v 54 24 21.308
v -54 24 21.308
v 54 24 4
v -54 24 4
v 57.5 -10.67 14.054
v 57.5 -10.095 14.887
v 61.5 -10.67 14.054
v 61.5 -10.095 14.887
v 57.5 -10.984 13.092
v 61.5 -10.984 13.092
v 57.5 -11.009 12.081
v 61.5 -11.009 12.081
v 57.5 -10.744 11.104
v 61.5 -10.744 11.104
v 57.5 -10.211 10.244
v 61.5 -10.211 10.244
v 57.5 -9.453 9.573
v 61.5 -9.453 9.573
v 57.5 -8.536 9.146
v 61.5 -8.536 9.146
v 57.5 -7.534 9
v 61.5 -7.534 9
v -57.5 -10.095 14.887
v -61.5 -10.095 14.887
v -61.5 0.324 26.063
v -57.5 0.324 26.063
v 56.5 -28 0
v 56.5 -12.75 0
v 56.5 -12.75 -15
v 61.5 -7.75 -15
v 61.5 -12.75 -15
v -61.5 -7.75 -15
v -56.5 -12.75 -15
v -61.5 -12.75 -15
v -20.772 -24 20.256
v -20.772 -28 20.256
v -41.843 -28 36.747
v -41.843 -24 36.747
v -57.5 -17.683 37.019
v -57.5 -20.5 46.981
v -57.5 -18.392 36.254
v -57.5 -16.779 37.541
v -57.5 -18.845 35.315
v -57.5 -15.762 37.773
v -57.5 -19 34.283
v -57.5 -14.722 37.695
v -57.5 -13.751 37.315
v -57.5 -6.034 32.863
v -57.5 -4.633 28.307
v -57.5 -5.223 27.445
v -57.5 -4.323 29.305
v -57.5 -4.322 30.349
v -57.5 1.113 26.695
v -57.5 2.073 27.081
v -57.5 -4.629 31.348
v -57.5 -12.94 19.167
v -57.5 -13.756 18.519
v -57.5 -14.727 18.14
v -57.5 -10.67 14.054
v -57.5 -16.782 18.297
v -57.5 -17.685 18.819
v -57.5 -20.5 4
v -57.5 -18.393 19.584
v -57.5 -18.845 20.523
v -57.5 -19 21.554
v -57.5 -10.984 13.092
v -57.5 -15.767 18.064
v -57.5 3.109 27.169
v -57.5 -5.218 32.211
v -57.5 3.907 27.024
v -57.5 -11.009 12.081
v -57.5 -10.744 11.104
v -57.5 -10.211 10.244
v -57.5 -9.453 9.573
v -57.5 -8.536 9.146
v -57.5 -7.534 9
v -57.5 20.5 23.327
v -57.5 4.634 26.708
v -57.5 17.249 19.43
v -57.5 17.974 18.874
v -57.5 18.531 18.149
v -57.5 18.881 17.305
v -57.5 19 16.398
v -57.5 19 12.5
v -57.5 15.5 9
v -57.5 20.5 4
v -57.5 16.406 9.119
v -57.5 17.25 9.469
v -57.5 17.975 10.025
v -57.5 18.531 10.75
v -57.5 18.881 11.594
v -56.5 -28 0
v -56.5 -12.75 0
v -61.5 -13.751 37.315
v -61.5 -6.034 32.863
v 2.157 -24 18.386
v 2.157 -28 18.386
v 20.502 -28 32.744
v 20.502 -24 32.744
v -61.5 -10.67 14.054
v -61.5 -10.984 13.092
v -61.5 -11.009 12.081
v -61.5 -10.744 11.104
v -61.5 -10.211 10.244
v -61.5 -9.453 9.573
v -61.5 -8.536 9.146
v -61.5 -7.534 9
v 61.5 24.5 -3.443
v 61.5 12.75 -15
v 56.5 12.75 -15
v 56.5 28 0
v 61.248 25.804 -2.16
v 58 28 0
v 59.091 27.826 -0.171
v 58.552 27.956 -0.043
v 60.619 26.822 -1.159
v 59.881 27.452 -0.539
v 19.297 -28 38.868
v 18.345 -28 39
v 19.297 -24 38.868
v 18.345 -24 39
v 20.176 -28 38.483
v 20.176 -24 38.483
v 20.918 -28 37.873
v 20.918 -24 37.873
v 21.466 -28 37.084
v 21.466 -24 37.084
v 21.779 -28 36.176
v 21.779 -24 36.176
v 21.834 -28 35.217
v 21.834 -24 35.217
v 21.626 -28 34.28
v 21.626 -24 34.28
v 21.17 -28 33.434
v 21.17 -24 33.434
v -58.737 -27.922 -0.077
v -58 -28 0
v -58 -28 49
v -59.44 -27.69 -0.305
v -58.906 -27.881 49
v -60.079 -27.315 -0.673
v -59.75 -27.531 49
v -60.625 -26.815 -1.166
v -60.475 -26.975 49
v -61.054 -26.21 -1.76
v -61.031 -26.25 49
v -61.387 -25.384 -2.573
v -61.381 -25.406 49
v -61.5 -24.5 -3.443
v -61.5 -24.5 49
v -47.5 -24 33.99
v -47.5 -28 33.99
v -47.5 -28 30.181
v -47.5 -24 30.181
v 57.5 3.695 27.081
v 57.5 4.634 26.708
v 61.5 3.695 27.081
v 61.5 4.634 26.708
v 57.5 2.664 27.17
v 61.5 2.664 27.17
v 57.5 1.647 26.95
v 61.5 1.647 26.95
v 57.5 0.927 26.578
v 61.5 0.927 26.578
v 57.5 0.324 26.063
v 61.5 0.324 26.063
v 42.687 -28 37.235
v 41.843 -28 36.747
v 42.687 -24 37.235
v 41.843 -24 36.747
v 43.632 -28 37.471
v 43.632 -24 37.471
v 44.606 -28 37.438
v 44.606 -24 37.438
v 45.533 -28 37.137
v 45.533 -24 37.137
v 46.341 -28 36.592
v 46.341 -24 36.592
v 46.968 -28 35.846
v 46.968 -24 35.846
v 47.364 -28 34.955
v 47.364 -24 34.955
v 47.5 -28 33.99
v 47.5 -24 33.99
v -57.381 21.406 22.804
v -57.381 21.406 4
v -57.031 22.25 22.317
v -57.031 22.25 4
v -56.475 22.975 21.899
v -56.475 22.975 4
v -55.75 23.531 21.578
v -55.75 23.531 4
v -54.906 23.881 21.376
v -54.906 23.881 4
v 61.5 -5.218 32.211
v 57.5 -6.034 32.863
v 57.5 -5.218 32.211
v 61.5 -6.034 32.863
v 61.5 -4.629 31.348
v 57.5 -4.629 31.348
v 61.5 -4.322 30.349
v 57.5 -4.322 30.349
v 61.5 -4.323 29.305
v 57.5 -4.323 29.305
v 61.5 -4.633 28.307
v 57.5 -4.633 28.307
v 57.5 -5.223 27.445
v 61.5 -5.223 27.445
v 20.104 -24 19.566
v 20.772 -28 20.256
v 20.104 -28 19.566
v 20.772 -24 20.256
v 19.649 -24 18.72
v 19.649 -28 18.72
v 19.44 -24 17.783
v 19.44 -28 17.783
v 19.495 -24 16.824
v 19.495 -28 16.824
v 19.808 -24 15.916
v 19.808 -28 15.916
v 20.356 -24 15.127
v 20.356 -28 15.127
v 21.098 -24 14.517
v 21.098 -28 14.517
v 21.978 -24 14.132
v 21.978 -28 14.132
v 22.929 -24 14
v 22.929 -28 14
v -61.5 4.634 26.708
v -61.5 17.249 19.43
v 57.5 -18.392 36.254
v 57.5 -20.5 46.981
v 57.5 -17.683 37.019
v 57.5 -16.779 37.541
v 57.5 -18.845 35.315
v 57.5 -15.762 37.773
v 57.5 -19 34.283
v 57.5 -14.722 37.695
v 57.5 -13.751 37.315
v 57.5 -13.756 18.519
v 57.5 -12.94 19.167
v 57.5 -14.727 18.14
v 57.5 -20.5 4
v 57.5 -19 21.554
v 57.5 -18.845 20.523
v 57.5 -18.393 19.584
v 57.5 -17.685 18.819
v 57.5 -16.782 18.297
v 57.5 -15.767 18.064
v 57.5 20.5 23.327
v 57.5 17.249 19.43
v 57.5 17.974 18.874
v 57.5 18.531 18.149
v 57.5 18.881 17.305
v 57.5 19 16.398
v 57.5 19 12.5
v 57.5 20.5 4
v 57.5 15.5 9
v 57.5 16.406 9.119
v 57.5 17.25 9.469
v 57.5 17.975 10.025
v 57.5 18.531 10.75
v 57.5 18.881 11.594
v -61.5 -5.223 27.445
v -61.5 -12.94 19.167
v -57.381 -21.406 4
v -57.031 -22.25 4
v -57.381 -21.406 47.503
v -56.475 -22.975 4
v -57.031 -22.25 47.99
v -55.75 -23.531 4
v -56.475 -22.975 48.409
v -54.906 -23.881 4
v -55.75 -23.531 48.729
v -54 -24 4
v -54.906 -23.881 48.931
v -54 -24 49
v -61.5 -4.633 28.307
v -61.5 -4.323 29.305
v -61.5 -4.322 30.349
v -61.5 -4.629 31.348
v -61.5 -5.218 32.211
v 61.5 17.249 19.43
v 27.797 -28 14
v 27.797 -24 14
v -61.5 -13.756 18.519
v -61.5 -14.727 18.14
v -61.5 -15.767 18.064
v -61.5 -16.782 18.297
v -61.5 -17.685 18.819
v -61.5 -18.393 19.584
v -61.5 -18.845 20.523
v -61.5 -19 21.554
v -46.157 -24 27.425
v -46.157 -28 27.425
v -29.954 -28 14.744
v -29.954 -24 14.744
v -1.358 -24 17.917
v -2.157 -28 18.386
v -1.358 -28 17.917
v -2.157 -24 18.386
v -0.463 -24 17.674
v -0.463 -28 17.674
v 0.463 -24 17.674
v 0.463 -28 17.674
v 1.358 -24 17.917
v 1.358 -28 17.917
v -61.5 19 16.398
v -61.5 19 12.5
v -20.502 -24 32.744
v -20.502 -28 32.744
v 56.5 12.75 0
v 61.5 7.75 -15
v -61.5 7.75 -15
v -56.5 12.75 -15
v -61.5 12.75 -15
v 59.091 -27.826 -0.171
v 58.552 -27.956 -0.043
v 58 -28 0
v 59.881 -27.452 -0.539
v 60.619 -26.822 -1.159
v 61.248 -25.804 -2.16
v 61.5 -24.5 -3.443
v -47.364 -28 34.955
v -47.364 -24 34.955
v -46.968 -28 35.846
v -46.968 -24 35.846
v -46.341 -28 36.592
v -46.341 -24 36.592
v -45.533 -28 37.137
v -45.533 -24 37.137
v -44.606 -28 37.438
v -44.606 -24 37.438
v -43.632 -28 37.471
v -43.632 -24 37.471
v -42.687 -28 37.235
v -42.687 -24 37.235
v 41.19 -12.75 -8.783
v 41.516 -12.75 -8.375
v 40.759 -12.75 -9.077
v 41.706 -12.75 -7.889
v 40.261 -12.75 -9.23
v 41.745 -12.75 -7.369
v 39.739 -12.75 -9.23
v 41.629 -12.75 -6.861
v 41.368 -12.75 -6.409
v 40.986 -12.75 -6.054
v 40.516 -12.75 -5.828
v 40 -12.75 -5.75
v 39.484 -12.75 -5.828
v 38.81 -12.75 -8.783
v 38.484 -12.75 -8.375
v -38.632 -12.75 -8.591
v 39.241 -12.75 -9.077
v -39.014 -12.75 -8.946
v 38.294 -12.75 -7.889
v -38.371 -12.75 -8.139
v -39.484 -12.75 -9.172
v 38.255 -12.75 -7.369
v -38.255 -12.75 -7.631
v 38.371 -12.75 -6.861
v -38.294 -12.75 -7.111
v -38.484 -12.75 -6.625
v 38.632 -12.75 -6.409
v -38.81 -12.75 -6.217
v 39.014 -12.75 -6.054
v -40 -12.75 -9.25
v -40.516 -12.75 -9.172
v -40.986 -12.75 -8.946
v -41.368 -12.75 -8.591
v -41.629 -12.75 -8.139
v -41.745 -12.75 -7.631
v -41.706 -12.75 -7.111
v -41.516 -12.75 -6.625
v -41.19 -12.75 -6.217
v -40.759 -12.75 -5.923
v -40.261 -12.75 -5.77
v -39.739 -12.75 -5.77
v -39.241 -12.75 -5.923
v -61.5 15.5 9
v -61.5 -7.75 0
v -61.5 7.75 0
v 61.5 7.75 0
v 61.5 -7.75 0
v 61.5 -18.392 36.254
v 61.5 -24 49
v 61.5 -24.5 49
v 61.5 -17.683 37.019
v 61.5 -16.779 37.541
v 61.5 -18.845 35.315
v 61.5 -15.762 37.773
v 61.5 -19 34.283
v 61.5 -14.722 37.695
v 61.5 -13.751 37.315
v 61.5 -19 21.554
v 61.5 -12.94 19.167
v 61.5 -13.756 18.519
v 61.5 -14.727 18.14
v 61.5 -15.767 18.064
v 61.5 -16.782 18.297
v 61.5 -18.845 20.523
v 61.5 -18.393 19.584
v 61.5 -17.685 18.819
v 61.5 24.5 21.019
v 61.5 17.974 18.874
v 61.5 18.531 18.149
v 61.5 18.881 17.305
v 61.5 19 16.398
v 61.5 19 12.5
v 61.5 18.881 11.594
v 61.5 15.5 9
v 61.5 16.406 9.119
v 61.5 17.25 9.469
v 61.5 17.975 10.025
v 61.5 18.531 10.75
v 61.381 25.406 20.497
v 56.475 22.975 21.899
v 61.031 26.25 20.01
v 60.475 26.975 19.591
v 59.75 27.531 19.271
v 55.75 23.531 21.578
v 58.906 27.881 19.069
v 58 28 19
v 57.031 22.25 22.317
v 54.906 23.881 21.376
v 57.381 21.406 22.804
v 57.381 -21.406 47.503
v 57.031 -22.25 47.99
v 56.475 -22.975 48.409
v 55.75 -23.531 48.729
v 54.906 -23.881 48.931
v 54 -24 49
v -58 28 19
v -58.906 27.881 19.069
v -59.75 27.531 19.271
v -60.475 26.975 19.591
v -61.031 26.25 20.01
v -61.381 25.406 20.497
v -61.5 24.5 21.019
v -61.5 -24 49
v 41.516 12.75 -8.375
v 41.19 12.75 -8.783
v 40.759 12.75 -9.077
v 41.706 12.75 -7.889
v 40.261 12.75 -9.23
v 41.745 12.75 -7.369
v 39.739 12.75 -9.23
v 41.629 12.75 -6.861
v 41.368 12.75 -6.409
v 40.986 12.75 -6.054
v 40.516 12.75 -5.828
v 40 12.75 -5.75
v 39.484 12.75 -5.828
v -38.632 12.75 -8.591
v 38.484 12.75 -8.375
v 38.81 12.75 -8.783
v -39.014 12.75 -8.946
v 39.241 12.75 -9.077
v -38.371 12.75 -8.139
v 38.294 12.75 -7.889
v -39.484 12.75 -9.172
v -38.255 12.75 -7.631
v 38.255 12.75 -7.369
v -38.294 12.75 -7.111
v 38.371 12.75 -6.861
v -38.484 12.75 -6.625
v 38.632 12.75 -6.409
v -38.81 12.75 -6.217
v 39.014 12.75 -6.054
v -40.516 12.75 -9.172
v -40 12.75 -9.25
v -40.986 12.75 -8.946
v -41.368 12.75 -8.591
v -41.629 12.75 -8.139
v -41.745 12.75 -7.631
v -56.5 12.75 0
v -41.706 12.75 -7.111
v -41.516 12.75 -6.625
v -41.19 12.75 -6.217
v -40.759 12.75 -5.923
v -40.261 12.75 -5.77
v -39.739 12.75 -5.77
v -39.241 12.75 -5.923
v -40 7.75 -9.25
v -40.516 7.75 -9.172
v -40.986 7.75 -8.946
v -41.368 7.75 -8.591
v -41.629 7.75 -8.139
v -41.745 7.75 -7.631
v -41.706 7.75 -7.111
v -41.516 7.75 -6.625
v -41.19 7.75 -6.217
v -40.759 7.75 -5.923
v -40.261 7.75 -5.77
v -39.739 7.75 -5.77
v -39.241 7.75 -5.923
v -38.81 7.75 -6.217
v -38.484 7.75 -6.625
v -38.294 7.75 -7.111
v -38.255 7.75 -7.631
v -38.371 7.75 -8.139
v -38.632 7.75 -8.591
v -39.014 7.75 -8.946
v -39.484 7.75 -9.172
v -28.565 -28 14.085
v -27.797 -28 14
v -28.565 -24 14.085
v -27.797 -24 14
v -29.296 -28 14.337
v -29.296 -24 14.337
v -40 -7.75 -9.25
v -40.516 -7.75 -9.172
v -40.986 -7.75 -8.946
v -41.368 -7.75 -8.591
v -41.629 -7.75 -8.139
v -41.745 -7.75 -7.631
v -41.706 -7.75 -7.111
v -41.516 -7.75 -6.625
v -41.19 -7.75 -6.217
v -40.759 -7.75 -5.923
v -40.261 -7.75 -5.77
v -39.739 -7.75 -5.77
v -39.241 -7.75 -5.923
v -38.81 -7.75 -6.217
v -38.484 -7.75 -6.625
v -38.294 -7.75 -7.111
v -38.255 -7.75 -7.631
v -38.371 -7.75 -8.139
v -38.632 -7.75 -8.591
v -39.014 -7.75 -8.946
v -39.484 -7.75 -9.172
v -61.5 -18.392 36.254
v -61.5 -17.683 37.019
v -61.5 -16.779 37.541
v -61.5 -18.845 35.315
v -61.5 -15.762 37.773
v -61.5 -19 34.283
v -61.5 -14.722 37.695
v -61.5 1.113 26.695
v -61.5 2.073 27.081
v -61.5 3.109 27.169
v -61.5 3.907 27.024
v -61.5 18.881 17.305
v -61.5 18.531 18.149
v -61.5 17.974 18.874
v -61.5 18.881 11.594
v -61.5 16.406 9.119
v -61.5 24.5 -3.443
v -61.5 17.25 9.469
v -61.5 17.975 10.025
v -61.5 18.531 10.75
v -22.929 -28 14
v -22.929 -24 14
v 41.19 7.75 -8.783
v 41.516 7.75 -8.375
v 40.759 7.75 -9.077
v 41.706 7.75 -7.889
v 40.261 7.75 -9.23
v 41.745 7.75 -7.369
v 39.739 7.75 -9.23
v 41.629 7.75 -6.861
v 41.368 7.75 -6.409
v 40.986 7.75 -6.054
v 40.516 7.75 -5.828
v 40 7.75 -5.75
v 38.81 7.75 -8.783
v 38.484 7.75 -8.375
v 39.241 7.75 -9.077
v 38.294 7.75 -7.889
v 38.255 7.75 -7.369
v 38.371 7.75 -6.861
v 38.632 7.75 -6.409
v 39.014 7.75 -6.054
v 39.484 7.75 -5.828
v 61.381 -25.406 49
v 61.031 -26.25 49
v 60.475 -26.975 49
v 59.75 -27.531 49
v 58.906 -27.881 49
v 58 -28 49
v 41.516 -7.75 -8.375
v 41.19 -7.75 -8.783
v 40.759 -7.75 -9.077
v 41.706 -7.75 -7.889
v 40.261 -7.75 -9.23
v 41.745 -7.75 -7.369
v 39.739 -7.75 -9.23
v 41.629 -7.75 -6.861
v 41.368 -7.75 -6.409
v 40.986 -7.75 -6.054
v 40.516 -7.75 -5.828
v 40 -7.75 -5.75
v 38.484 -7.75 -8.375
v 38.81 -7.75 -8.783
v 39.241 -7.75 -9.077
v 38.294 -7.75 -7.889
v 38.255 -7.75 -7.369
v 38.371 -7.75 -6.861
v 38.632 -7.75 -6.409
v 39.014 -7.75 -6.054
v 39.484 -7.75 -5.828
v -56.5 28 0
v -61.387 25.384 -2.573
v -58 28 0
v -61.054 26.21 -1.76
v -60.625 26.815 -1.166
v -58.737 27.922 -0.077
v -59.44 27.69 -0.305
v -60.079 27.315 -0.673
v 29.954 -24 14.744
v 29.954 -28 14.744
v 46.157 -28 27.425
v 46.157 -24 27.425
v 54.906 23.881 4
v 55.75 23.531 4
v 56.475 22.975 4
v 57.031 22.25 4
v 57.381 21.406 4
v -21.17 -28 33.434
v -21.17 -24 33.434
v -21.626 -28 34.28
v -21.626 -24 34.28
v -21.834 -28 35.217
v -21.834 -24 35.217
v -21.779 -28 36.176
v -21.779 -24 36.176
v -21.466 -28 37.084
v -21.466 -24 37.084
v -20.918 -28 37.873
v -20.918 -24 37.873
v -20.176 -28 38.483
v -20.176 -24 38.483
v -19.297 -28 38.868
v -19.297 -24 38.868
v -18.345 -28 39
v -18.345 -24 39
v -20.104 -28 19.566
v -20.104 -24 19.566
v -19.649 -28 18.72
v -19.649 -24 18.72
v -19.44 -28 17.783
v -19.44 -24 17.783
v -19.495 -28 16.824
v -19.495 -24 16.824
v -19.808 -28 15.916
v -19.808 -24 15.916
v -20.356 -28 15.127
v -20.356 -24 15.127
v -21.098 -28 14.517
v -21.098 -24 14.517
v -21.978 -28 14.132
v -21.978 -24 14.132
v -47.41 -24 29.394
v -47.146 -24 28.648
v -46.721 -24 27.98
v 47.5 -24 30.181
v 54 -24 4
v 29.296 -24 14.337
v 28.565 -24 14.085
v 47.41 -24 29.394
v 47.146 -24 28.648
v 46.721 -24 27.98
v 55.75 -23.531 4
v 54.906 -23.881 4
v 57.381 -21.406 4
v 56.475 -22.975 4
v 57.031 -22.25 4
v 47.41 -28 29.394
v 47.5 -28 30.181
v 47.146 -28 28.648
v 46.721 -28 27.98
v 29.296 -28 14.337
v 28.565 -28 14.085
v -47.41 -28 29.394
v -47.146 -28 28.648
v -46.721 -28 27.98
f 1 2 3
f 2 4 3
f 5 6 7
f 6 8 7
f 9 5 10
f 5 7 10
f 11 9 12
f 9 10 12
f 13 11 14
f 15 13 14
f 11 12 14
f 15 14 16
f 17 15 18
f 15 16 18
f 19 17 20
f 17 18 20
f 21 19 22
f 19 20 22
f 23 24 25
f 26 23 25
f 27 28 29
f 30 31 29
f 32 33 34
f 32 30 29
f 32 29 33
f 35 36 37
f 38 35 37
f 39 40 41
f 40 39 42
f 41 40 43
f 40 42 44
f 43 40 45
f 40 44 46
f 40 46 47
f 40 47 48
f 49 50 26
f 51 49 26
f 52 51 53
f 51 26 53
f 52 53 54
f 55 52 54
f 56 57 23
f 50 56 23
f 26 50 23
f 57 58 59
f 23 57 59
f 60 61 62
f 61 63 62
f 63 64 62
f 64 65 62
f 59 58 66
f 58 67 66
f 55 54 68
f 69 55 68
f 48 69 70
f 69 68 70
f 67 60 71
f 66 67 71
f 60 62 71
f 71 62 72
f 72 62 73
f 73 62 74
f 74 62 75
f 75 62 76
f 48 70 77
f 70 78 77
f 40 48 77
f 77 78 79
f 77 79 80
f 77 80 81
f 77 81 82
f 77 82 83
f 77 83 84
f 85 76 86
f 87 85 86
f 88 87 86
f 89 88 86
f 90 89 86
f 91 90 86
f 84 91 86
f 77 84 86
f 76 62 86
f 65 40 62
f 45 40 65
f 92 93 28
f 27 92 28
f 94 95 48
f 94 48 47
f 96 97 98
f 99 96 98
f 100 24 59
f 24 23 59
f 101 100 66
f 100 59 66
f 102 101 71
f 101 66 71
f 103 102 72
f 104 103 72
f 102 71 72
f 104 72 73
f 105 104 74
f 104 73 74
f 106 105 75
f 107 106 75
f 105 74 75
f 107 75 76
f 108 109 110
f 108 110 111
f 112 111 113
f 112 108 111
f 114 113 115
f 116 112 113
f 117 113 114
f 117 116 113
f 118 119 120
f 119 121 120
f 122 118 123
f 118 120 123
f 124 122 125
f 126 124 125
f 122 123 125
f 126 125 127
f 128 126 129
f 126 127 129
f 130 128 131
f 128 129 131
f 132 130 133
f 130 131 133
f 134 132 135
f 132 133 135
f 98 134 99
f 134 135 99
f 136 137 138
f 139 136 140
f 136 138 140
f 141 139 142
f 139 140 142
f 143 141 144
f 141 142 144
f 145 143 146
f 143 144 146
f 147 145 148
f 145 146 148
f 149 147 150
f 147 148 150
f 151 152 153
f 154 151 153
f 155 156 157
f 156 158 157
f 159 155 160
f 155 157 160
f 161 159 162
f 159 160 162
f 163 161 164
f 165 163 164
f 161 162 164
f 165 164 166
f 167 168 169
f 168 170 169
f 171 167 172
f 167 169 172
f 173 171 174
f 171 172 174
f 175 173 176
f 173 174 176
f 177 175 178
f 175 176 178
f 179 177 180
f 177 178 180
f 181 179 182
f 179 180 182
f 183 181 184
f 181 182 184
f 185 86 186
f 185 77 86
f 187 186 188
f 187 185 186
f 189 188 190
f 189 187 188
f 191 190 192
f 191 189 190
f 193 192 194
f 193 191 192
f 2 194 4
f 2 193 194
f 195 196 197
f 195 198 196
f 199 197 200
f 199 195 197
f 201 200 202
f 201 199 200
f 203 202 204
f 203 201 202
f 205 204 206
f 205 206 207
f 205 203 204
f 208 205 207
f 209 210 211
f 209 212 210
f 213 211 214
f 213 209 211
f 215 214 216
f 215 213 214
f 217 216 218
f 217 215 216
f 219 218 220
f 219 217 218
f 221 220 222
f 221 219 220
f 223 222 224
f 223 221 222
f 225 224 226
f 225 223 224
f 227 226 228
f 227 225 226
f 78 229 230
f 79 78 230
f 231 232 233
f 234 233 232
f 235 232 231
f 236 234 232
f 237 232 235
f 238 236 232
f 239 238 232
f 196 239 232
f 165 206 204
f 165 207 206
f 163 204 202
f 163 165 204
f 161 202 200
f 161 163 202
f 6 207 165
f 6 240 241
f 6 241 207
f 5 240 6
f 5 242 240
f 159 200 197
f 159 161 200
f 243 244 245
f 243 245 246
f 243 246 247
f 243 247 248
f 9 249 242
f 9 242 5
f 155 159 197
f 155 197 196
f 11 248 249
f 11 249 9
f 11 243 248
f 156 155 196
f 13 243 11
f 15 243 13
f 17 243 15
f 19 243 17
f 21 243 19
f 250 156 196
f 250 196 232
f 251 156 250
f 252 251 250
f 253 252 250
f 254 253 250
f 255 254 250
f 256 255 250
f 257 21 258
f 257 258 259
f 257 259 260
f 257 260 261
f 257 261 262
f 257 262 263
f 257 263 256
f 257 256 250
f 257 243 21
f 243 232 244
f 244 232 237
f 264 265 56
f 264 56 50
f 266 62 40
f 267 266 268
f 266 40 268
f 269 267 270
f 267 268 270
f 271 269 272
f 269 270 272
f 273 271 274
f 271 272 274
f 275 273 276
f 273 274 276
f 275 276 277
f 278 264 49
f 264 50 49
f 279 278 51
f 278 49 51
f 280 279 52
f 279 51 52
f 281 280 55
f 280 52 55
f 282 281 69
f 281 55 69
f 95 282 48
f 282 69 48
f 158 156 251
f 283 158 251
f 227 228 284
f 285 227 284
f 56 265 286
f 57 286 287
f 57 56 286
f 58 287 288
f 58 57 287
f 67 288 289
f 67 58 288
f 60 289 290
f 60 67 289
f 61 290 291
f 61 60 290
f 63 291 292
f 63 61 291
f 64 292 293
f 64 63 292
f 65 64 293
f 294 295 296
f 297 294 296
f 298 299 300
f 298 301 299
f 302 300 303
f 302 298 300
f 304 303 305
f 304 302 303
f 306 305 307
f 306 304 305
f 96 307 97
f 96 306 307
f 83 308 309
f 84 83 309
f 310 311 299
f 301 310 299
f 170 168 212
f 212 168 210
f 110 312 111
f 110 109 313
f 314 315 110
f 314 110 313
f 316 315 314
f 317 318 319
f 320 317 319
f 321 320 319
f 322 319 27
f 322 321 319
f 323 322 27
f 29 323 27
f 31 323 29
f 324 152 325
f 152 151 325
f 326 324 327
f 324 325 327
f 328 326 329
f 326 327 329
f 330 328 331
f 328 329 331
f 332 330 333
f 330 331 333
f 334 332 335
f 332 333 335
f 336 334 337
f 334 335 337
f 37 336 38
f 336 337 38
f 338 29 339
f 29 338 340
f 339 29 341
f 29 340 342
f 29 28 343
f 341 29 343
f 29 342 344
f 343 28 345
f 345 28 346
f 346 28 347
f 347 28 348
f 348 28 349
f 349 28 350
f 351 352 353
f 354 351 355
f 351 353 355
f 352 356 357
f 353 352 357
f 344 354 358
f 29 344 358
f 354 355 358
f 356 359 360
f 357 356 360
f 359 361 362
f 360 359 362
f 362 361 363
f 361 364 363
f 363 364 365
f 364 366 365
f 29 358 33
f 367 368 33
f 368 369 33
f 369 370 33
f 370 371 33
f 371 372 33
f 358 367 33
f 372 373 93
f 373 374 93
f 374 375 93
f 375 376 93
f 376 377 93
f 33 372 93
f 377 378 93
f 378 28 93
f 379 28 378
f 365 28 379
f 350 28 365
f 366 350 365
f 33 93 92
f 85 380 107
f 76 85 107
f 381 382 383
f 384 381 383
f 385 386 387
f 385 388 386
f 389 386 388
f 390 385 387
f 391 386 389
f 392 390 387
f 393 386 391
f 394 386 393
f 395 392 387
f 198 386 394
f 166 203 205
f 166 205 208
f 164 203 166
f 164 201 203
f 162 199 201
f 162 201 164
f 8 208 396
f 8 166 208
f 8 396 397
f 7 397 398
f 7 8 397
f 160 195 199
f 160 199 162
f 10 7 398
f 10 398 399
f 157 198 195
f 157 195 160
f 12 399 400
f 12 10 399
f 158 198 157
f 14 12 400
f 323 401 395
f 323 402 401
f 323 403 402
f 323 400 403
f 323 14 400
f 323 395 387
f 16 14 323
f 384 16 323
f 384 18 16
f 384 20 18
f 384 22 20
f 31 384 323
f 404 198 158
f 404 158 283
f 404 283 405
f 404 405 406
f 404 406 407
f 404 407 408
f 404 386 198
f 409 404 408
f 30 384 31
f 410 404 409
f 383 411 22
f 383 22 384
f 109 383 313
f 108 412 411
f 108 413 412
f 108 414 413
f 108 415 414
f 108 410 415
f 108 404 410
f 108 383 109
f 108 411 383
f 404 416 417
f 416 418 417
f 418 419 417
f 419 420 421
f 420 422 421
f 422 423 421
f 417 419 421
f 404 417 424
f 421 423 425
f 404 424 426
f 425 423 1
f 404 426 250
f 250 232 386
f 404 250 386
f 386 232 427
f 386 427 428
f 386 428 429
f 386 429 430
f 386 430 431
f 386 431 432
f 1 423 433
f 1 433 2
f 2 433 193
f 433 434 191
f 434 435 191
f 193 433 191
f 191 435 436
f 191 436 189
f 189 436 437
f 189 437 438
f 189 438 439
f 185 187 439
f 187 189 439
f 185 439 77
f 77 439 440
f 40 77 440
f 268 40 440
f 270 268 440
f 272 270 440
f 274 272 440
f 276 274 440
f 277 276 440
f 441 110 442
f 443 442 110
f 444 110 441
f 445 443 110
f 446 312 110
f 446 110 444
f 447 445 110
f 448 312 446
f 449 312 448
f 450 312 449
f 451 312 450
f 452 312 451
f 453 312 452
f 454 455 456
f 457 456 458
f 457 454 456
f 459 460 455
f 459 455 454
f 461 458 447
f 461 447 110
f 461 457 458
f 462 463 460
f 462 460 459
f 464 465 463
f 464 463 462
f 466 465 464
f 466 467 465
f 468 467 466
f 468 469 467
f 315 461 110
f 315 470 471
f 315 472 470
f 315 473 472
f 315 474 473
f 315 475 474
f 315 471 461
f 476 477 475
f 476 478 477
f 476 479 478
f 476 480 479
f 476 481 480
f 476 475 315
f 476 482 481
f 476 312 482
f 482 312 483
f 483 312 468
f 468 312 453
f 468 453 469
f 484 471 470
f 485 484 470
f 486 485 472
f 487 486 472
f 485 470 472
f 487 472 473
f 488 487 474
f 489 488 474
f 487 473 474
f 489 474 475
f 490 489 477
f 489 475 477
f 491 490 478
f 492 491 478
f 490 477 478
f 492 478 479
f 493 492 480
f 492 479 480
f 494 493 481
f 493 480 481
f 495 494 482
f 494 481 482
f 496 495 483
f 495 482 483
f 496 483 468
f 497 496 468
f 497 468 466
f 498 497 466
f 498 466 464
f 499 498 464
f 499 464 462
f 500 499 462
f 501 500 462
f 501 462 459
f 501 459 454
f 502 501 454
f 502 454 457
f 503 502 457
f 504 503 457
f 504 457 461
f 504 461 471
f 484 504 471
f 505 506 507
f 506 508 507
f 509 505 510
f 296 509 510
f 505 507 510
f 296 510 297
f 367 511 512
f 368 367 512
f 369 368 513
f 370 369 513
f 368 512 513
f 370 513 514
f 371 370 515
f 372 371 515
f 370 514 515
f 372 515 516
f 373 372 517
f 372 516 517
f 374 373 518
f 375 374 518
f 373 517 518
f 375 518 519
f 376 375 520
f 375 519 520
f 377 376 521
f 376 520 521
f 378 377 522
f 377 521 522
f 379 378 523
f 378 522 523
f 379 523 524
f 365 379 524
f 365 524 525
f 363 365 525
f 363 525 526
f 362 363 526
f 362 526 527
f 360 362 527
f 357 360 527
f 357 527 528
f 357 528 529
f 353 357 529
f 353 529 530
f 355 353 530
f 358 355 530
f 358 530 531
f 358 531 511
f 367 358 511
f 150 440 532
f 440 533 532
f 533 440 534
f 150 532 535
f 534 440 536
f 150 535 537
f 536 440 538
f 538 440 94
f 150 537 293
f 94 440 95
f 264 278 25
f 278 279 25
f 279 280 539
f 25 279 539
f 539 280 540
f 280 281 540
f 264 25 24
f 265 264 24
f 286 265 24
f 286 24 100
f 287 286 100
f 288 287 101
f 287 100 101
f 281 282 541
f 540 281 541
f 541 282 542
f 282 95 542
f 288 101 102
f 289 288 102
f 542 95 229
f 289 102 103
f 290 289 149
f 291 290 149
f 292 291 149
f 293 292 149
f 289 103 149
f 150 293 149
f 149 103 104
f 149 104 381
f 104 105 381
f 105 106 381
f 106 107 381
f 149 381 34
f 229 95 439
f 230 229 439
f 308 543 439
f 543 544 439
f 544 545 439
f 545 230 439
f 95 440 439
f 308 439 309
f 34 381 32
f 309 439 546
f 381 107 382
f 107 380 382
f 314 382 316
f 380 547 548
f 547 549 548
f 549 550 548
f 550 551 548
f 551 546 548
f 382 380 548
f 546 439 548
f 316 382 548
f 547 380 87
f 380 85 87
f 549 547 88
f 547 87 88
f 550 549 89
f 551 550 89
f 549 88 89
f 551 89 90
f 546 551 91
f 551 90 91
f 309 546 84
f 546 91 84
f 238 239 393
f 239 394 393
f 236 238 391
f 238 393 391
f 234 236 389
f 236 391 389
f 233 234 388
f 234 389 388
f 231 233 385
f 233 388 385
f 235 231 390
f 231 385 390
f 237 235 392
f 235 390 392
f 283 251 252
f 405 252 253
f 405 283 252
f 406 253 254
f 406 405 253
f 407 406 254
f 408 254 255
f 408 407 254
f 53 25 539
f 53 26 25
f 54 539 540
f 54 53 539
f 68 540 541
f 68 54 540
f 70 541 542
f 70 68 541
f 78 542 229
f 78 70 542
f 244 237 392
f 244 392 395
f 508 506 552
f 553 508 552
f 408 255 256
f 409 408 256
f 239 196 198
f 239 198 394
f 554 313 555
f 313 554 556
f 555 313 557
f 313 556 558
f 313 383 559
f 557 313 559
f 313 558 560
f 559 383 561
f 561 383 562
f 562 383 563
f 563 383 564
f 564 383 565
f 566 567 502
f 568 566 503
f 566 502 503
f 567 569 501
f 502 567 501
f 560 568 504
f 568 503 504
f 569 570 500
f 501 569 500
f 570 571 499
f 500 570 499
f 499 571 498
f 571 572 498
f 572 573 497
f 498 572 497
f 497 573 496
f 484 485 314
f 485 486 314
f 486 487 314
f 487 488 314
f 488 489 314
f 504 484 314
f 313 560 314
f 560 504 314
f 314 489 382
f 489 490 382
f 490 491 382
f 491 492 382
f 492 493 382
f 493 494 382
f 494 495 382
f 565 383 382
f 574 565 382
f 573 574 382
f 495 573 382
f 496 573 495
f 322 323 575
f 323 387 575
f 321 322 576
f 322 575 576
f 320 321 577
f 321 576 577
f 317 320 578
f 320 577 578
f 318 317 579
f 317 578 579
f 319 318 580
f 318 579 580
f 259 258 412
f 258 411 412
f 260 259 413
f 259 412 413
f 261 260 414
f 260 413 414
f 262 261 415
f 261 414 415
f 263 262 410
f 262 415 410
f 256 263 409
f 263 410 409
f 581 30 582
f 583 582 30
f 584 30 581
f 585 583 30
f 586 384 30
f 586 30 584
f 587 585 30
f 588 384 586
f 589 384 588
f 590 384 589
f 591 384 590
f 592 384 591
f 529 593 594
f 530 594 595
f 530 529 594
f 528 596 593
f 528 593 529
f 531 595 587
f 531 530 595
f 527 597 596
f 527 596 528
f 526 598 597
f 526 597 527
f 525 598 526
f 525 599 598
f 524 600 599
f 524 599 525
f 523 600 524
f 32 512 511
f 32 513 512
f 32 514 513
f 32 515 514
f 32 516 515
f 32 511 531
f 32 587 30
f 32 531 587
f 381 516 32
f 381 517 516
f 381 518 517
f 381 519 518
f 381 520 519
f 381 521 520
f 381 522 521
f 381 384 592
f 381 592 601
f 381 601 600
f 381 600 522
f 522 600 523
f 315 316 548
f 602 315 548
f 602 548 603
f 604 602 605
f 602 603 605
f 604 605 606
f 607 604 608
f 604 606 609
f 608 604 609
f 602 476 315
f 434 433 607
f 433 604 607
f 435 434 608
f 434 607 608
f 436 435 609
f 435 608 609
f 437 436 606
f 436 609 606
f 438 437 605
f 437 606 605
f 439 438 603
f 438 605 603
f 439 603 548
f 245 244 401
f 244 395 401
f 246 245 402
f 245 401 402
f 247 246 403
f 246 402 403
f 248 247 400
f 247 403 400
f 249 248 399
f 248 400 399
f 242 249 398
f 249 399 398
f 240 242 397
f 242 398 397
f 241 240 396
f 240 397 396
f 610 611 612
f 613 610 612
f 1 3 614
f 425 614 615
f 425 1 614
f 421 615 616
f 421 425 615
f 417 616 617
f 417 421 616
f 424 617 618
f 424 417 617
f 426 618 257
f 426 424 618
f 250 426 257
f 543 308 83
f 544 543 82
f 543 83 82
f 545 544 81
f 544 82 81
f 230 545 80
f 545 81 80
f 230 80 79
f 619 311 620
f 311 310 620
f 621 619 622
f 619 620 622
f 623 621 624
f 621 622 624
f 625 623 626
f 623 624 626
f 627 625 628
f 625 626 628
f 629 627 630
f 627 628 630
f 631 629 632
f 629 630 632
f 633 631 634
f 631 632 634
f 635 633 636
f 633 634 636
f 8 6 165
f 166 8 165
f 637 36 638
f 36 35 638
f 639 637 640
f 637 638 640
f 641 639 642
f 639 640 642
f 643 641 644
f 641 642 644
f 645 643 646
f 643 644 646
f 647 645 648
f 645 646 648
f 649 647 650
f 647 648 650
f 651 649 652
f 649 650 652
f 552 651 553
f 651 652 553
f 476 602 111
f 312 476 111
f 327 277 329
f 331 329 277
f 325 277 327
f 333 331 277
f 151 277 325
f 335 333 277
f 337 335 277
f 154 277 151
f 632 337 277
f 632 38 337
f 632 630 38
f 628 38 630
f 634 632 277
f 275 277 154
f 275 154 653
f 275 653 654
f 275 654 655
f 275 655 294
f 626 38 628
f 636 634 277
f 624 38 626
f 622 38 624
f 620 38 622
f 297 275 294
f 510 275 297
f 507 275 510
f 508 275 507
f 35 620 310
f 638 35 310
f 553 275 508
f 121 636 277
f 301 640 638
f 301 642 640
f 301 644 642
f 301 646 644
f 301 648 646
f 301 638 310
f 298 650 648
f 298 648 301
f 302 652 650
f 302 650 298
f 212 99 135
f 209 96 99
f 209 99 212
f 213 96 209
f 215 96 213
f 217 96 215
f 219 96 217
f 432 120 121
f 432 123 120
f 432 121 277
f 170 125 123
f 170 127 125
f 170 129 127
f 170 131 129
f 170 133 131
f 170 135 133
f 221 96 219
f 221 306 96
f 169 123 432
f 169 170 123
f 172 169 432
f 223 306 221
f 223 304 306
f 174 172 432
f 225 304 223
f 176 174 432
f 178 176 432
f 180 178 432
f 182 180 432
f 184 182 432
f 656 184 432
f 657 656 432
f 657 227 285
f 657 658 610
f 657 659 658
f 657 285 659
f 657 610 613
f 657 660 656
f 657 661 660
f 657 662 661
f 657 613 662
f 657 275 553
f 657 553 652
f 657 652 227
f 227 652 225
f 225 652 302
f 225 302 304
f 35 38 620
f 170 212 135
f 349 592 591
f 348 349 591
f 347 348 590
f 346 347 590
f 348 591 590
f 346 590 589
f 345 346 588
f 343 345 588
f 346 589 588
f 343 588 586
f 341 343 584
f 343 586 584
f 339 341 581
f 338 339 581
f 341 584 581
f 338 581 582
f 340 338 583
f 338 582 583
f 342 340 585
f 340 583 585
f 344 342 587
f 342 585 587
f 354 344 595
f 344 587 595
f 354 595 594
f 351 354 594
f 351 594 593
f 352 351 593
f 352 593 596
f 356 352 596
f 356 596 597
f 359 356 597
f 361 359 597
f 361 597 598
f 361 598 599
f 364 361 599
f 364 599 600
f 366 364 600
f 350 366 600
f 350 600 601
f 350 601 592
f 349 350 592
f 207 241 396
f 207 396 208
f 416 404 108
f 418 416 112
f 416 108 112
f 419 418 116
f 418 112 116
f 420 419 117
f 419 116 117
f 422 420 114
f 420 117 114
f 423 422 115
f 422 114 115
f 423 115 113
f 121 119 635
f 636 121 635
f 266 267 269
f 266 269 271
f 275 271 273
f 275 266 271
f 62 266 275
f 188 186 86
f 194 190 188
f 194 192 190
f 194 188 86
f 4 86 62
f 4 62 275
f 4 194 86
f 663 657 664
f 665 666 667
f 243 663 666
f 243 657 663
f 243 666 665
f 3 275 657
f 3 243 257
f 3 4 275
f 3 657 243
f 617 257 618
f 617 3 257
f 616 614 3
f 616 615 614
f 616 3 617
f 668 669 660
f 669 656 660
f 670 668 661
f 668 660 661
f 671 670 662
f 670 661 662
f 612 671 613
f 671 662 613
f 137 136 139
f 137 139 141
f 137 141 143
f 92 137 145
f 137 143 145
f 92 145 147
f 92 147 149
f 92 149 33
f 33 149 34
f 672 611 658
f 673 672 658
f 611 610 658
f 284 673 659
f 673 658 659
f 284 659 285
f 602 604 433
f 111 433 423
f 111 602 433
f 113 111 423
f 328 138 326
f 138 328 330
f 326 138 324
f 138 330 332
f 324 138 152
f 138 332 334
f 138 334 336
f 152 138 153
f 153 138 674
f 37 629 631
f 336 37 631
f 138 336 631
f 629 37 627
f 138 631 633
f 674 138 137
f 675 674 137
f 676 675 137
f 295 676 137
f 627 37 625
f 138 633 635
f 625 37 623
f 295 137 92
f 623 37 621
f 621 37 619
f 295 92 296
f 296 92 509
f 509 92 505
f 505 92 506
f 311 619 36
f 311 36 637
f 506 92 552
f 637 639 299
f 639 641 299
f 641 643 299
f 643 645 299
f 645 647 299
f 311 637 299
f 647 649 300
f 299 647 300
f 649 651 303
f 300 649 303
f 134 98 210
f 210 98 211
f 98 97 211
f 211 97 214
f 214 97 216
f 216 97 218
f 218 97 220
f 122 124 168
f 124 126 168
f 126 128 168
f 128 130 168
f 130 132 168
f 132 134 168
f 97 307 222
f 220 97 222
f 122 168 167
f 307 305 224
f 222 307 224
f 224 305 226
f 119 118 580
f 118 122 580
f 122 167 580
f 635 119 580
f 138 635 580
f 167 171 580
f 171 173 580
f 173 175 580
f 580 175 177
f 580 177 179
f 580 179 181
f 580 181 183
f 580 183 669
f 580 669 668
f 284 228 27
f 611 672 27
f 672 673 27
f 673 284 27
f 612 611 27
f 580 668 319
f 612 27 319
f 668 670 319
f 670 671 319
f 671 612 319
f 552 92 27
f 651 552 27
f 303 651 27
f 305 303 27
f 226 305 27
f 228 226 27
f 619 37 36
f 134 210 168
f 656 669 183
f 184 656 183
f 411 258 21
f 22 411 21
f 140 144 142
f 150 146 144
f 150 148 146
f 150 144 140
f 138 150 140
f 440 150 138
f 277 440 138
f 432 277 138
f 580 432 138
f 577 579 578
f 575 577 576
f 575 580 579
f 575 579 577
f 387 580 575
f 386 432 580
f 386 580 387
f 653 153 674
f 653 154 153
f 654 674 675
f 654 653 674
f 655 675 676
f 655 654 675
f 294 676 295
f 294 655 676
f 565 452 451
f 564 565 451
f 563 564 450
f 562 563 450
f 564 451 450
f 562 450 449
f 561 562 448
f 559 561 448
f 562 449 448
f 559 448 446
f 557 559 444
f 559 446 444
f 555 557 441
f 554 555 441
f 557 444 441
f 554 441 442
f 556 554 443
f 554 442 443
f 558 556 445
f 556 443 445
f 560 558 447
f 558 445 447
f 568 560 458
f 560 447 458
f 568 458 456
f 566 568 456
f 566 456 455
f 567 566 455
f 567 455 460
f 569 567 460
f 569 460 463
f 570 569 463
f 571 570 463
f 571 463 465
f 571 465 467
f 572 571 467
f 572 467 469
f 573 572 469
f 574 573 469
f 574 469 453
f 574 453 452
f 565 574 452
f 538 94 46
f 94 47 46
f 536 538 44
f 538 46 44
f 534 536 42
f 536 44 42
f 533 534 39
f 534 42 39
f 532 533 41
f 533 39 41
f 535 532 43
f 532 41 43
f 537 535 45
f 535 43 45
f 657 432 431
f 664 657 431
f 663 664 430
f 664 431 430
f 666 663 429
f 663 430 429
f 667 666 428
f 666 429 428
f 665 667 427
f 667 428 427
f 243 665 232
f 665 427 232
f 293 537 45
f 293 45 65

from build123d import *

# Parameters (mm, degrees)
SKETCH1_W           = 123
SKETCH1_H           = 56
BOSS_EXTRUDE1_DEPTH = 4
SKETCH1_3_W         = 123
SKETCH1_3_H         = 56
SKETCH1_3_W_2       = 115
SKETCH1_3_H_2       = 48
BOSS_EXTRUDE2_DEPTH = 49
SKETCH2_W           = 123
SKETCH2_H           = 5
BOSS_EXTRUDE3_DEPTH = 15
BOSS_EXTRUDE4_DEPTH = 5
CUT_EXTRUDE1_DEPTH  = 136.329228181
CUT_EXTRUDE2_DEPTH  = 136.329228181
CUT_EXTRUDE3_DEPTH  = 5
FILLET5_R           = 3.5
FILLET6_R           = 3.5
FILLET7_R           = 3.5
FILLET8_R           = 3.5
SKETCH8_R           = 1.75
CUT_EXTRUDE4_DEPTH  = 89.565300892


with BuildPart() as part:
    # Sketch1 → Boss-Extrude1 (new body)
    with BuildSketch(Plane.XY):
        Rectangle(SKETCH1_W, SKETCH1_H)
    extrude(amount=BOSS_EXTRUDE1_DEPTH)

    # Sketch1<3> → Boss-Extrude2 (add)
    with BuildSketch(Plane.XY):
        Rectangle(SKETCH1_3_W, SKETCH1_3_H)
        Rectangle(SKETCH1_3_W_2, SKETCH1_3_H_2, mode=Mode.SUBTRACT)
    extrude(amount=BOSS_EXTRUDE2_DEPTH)

    # Sketch2 → Boss-Extrude3 (add)
    with BuildSketch(Plane(origin=(0, 0, 0), x_dir=(-1, 0, 0), z_dir=(0, 0, -1))):
        with Locations((0, 10.25)):
            Rectangle(SKETCH2_W, SKETCH2_H)
        with Locations((0, -10.25)):
            Rectangle(SKETCH2_W, SKETCH2_H)
    extrude(amount=BOSS_EXTRUDE3_DEPTH)

    # Sketch3 → Boss-Extrude4 (add)
    with BuildSketch(Plane(origin=(61.5, 0, 0), x_dir=(0, 0, -1), z_dir=(1, 0, 0))):
        Polygon((0, -28), (15, -12.75), (0, -12.75), align=None)
        Polygon((15, 12.75), (0, 28), (0, 12.75), align=None)
    boss_extrude4 = extrude(amount=-BOSS_EXTRUDE4_DEPTH)

    # Mirror1: Boss-Extrude4 across plane
    add(boss_extrude4.mirror(Plane.ZY))

    # Sketch4 → Cut-Extrude1 (cut, through all)
    with BuildSketch(Plane.ZY.offset(61.5)):
        Polygon((19, 28), (49, -24), (49, 24), (49, 28), align=None)
    extrude(amount=-CUT_EXTRUDE1_DEPTH, mode=Mode.SUBTRACT)

    # Sketch6 → Cut-Extrude2 (cut, through all)
    with BuildSketch(Plane.ZY.offset(61.5)):
        Polygon((12.66631443, -19), (40.342949608, -19), (30.66362763, -2.222508572), align=None)
        Polygon((28.088718183, 2.240667802), (18.419872685, 19), (9, 19), (9, -15.582181004), (27.67670193, 1.828651549), align=None)
    extrude(amount=-CUT_EXTRUDE2_DEPTH, mode=Mode.SUBTRACT)

    # Sketch7 → Cut-Extrude3 (cut)
    with BuildSketch(Plane.XZ.offset(28)):
        Polygon((-12.777777778, 14), (-47.5, 41.173913043), (-47.5, 28.475580986), (-29.003424296, 14), align=None)
        Polygon((47.5, 41.173913043), (12.777777778, 14), (29.003424296, 14), (47.5, 28.475580986), align=None)
        Polygon((-28.496575704, 39), (0, 16.698332058), (28.496575704, 39), align=None)
    extrude(amount=-CUT_EXTRUDE3_DEPTH, mode=Mode.SUBTRACT)

    # Fillet5
    fillet5_edges = [part.edges().sort_by_distance(p)[0] for p in [
        (-12.777777778, -26, 14),
        (12.777777778, -26, 14),
        (47.5, -26, 41.173913043),
        (28.496575704, -26, 39),
        (-47.5, -26, 41.173913043),
        (-47.5, -26, 28.475580986),
        (-28.496575704, -26, 39),
        (47.5, -26, 28.475580986),
        (29.003424296, -26, 14),
        (0, -26, 16.698332058),
        (-29.003424296, -26, 14),
    ]]
    fillet(fillet5_edges, radius=FILLET5_R)

    # Fillet6
    fillet6_edges = [part.edges().sort_by_distance(p)[0] for p in [
        (-59.5, 19, 18.419872685),
        (-59.5, 19, 9),
        (-59.5, -15.582181004, 9),
        (-59.5, -19, 12.66631443),
        (-59.5, -19, 40.342949608),
        (-59.5, -2.222508572, 30.66362763),
        (-59.5, 2.240667802, 28.088718183),
        (59.5, -2.222508572, 30.66362763),
        (59.5, 2.240667802, 28.088718183),
        (59.5, -19, 40.342949608),
        (59.5, 19, 9),
        (59.5, 19, 18.419872685),
        (59.5, -19, 12.66631443),
        (59.5, -15.582181004, 9),
    ]]
    fillet(fillet6_edges, radius=FILLET6_R)

    # Fillet7
    fillet7_edges = [part.edges().sort_by_distance(p)[0] for p in [
        (-57.5, 24, 12.653846154),
        (-57.5, -24, 26.5),
        (57.5, 24, 12.653846154),
        (57.5, -24, 26.5),
    ]]
    fillet(fillet7_edges, radius=FILLET7_R)

    # Fillet8
    fillet8_edges = [part.edges().sort_by_distance(p)[0] for p in [
        (-61.5, -28, 24.5),
        (61.5, -28, 24.5),
        (61.5, 28, 9.5),
        (-61.5, 28, 9.5),
    ]]
    fillet(fillet8_edges, radius=FILLET8_R)

    # Sketch8 → Cut-Extrude4 (cut, through all)
    with BuildSketch(Plane(origin=(0, 12.75, 0), x_dir=(1, 0, 0), z_dir=(0, 1, 0))):
        with Locations((40, 7.5)):
            Circle(SKETCH8_R)
        with Locations((-40, 7.5)):
            Circle(SKETCH8_R)
    extrude(amount=-CUT_EXTRUDE4_DEPTH, mode=Mode.SUBTRACT)


solid = part.part
